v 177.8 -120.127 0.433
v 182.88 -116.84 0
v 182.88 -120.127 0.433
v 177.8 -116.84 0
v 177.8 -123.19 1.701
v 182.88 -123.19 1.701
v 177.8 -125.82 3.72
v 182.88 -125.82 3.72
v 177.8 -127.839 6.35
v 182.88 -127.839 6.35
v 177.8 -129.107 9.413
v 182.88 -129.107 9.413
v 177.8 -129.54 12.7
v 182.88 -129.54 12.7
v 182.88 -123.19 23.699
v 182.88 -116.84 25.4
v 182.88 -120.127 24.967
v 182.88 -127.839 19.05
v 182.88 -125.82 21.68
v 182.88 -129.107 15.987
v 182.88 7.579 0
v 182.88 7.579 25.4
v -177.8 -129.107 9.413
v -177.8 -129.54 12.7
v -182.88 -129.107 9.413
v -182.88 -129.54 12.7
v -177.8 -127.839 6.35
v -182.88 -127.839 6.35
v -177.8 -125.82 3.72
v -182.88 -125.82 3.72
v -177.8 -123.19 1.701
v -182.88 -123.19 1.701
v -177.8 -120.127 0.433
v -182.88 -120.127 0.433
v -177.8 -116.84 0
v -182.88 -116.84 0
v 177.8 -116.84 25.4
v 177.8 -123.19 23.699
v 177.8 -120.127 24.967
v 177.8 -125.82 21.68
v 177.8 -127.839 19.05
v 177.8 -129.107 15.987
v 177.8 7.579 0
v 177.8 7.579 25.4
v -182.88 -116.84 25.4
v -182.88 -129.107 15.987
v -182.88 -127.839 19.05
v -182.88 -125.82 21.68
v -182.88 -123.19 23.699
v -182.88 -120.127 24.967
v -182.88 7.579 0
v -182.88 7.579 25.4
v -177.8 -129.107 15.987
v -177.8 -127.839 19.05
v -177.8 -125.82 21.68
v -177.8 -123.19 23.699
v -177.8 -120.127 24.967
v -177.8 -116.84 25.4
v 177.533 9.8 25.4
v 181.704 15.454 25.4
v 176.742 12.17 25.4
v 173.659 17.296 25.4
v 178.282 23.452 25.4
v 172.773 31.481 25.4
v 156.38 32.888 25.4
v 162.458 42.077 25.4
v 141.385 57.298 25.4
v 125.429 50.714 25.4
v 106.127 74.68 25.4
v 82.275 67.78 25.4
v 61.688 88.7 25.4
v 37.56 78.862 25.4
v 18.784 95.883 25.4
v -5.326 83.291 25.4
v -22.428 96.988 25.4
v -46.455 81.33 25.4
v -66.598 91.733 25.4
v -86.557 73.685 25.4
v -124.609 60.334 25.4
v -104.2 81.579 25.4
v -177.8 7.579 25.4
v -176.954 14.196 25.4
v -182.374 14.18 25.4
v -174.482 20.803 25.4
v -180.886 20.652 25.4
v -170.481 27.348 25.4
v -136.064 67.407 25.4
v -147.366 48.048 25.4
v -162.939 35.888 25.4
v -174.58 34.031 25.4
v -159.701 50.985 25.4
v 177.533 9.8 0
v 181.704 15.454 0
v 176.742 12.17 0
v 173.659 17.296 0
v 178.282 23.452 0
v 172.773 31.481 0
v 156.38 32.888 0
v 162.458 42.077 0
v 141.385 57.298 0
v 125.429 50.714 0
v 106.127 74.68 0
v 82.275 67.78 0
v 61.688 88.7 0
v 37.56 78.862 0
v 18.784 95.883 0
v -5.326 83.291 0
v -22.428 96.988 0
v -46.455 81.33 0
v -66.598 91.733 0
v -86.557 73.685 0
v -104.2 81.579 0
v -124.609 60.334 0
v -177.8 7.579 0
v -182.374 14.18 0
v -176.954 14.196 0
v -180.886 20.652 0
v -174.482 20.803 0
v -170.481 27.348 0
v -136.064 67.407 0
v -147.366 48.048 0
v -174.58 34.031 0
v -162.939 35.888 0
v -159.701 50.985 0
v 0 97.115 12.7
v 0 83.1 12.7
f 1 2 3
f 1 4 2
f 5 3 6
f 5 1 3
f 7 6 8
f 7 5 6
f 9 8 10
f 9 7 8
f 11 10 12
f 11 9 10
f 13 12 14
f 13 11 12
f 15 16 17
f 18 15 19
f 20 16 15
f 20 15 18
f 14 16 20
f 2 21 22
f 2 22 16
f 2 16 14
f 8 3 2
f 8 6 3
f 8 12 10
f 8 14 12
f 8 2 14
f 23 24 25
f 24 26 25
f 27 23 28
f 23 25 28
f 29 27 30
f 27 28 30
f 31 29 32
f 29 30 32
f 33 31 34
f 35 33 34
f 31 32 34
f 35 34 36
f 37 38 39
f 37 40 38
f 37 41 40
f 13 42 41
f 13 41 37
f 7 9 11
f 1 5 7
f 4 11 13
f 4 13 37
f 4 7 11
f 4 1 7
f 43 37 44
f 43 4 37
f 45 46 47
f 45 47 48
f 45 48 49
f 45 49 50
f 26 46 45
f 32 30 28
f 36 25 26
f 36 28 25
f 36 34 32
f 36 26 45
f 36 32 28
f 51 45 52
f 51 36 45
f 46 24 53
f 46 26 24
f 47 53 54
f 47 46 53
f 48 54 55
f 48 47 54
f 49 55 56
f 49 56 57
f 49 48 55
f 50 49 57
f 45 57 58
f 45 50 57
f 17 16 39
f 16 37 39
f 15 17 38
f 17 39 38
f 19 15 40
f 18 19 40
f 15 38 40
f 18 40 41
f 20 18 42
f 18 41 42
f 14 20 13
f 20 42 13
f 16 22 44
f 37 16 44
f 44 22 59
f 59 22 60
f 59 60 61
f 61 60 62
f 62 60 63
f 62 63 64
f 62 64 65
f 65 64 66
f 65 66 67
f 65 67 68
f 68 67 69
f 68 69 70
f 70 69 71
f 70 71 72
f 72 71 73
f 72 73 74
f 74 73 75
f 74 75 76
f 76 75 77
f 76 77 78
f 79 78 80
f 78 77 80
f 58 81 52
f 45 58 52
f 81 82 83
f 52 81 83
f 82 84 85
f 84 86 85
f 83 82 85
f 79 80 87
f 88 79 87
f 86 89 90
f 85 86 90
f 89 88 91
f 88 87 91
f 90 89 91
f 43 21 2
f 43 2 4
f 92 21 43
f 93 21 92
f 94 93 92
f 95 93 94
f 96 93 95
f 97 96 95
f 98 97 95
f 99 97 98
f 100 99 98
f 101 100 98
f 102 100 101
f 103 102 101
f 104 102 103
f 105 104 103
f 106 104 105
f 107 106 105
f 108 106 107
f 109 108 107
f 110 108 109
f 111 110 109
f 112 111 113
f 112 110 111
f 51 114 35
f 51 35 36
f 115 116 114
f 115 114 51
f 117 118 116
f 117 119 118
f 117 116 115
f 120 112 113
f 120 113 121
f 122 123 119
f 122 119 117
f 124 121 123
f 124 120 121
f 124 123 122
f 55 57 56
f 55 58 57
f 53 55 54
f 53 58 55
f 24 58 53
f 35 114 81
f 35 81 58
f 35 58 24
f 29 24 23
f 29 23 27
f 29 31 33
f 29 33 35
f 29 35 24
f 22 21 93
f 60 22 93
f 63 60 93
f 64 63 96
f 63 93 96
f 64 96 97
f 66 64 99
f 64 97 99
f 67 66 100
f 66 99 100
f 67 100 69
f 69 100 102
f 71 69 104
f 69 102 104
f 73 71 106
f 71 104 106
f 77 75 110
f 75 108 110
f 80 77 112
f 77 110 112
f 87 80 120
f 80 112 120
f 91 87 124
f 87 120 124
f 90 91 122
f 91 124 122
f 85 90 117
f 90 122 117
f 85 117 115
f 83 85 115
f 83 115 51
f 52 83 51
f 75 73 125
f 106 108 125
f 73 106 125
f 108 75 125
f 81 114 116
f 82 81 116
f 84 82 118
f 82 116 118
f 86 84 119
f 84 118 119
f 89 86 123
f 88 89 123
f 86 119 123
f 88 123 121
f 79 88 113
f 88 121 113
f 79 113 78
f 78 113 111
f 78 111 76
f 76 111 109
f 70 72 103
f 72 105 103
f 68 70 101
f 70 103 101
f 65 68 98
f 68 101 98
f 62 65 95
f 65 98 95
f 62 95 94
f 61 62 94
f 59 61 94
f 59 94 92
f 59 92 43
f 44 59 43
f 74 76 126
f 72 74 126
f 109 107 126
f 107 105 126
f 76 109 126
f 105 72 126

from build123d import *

# Parameters (mm, degrees)
BOSS_EXTRUDE2_DEPTH = 25.4
FILLET1_R           = 12.7
FILLET2_R           = 12.7


with BuildPart() as part:
    # Sketch3 → Boss-Extrude2 (new body)
    with BuildSketch(Plane.XY):
        with BuildLine():
            Line((-177.8, 7.57860608), (-177.8, -129.54))
            Line((-177.8, -129.54), (-182.88, -129.54))
            Line((-182.88, -129.54), (-182.88, 7.57860608))
            add(Edge.make_bspline(
                [(182.88, 7.57860608), (182.88, 46.763821962), (0, 141.394473708), (-182.88, 58.90806056), (-182.88, 7.57860608)],
                knots=[0, 0, 0, 0, 0.5, 1, 1, 1, 1], degree=3))
            Line((182.88, 7.57860608), (182.88, -129.54))
            Line((182.88, -129.54), (177.8, -129.54))
            Line((177.8, -129.54), (177.8, 7.57860608))
            add(Edge.make_bspline(
                [(-177.8, 7.57860608), (-177.8, 46.300078228), (0, 128.042210108), (177.8, 30.017127825), (177.8, 7.57860608)],
                knots=[0, 0, 0, 0, 0.5, 1, 1, 1, 1], degree=3))
        make_face()
    extrude(amount=BOSS_EXTRUDE2_DEPTH)

    # Fillet1
    fillet1_edges = [part.edges().sort_by_distance(p)[0] for p in [
        (-180.34, -129.54, 0),
        (-180.34, -129.54, 25.4),
    ]]
    fillet(fillet1_edges, radius=FILLET1_R - 0.0001)  # a hair under: the kernel refuses the full size

    # Fillet2
    fillet2_edges = [part.edges().sort_by_distance(p)[0] for p in [
        (180.34, -129.54, 0),
        (180.34, -129.54, 25.4),
    ]]
    fillet(fillet2_edges, radius=FILLET2_R - 0.0001)  # a hair under: the kernel refuses the full size


solid = part.part
